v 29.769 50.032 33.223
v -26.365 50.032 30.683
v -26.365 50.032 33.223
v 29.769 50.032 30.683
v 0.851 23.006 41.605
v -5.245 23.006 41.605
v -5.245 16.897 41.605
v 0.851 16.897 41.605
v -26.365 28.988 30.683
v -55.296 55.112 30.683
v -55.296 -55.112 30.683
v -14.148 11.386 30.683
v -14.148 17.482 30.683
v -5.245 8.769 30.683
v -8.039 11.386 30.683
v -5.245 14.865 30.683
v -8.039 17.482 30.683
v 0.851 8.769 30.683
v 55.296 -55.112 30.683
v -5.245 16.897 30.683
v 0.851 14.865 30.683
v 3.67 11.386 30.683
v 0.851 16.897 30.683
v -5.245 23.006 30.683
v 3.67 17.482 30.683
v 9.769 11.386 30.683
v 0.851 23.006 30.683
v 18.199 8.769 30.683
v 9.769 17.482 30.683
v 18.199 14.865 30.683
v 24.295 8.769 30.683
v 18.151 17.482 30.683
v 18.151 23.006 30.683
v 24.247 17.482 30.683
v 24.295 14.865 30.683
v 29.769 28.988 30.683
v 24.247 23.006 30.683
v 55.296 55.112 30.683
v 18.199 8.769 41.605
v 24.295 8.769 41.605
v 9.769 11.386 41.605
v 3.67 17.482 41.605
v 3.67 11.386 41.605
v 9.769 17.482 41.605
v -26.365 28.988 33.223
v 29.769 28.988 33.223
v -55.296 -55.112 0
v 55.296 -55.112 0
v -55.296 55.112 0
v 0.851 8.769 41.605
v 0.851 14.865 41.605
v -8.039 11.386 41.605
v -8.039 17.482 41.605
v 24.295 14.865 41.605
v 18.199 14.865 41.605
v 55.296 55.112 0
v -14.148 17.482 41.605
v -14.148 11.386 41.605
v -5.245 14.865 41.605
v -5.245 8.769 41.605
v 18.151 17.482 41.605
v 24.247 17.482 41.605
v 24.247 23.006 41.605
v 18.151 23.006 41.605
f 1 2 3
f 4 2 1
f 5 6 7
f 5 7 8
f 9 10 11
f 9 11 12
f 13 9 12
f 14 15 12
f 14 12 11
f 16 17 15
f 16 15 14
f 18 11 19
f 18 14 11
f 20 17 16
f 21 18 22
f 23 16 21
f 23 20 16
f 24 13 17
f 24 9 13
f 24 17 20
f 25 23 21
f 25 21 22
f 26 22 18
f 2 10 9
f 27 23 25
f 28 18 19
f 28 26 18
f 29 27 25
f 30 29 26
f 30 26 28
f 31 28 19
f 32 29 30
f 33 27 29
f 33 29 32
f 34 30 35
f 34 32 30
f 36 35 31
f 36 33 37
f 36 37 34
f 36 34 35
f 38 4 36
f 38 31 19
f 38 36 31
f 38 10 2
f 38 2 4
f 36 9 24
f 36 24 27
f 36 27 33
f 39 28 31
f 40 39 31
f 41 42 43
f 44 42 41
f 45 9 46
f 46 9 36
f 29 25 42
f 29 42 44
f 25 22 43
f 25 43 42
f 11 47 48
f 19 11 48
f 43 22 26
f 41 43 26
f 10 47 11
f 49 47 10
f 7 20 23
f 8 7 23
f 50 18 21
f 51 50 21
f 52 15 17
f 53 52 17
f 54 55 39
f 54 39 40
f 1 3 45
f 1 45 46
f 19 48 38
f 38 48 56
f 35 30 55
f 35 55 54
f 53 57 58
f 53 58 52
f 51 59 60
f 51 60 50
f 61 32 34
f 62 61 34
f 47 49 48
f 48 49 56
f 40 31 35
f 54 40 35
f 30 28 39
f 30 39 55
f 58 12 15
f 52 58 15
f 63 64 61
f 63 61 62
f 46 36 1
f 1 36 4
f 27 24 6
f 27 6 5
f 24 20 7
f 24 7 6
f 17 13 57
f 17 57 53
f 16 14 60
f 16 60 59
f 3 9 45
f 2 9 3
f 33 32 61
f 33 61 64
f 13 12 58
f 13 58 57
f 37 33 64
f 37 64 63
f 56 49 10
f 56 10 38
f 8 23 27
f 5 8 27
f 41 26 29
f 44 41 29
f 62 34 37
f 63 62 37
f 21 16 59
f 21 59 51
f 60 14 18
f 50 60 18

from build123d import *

# Parameters (mm, degrees)
SKETCH1_W           = 110.5916
SKETCH1_H           = 110.2233
BOSS_EXTRUDE1_DEPTH = 30.6832
SKETCH3_W           = 56.134
SKETCH3_H           = 21.0439
BOSS_EXTRUDE2_DEPTH = 2.54
SKETCH6_W           = 6.096
SKETCH6_H           = 6.1087
SKETCH6_W_2         = 6.1087
SKETCH6_H_2         = 6.096
SKETCH6_W_3         = 6.09854
SKETCH6_H_3         = 5.5245
BOSS_EXTRUDE3_DEPTH = 10.922


with BuildPart() as part:
    # Sketch1 → Boss-Extrude1 (new body)
    with BuildSketch(Plane.XY):
        Rectangle(SKETCH1_W, SKETCH1_H)
    extrude(amount=BOSS_EXTRUDE1_DEPTH)

    # Sketch3 → Boss-Extrude2 (add)
    with BuildSketch(Plane.XY.offset(30.6832)):
        with Locations((1.7018, 39.5097)):
            Rectangle(SKETCH3_W, SKETCH3_H)
    extrude(amount=BOSS_EXTRUDE2_DEPTH)

    # Sketch6 → Boss-Extrude3 (add)
    with BuildSketch(Plane.XY.offset(30.6832)):
        with Locations((-2.1971, 19.9517)):
            Rectangle(SKETCH6_W, SKETCH6_H)
        with Locations((-11.09345, 14.43355)):
            Rectangle(SKETCH6_W_2, SKETCH6_H_2)
        with Locations((6.71957, 14.43355)):
            Rectangle(SKETCH6_W_3, SKETCH6_H_2)
        with Locations((-2.1971, 11.81735)):
            Rectangle(SKETCH6_W, SKETCH6_H_2)
        with Locations((21.19884, 20.2438)):
            Rectangle(SKETCH6_W, SKETCH6_H_3)
        with Locations((21.2471, 11.81735)):
            Rectangle(SKETCH6_W, SKETCH6_H_2)
    extrude(amount=BOSS_EXTRUDE3_DEPTH)


solid = part.part
